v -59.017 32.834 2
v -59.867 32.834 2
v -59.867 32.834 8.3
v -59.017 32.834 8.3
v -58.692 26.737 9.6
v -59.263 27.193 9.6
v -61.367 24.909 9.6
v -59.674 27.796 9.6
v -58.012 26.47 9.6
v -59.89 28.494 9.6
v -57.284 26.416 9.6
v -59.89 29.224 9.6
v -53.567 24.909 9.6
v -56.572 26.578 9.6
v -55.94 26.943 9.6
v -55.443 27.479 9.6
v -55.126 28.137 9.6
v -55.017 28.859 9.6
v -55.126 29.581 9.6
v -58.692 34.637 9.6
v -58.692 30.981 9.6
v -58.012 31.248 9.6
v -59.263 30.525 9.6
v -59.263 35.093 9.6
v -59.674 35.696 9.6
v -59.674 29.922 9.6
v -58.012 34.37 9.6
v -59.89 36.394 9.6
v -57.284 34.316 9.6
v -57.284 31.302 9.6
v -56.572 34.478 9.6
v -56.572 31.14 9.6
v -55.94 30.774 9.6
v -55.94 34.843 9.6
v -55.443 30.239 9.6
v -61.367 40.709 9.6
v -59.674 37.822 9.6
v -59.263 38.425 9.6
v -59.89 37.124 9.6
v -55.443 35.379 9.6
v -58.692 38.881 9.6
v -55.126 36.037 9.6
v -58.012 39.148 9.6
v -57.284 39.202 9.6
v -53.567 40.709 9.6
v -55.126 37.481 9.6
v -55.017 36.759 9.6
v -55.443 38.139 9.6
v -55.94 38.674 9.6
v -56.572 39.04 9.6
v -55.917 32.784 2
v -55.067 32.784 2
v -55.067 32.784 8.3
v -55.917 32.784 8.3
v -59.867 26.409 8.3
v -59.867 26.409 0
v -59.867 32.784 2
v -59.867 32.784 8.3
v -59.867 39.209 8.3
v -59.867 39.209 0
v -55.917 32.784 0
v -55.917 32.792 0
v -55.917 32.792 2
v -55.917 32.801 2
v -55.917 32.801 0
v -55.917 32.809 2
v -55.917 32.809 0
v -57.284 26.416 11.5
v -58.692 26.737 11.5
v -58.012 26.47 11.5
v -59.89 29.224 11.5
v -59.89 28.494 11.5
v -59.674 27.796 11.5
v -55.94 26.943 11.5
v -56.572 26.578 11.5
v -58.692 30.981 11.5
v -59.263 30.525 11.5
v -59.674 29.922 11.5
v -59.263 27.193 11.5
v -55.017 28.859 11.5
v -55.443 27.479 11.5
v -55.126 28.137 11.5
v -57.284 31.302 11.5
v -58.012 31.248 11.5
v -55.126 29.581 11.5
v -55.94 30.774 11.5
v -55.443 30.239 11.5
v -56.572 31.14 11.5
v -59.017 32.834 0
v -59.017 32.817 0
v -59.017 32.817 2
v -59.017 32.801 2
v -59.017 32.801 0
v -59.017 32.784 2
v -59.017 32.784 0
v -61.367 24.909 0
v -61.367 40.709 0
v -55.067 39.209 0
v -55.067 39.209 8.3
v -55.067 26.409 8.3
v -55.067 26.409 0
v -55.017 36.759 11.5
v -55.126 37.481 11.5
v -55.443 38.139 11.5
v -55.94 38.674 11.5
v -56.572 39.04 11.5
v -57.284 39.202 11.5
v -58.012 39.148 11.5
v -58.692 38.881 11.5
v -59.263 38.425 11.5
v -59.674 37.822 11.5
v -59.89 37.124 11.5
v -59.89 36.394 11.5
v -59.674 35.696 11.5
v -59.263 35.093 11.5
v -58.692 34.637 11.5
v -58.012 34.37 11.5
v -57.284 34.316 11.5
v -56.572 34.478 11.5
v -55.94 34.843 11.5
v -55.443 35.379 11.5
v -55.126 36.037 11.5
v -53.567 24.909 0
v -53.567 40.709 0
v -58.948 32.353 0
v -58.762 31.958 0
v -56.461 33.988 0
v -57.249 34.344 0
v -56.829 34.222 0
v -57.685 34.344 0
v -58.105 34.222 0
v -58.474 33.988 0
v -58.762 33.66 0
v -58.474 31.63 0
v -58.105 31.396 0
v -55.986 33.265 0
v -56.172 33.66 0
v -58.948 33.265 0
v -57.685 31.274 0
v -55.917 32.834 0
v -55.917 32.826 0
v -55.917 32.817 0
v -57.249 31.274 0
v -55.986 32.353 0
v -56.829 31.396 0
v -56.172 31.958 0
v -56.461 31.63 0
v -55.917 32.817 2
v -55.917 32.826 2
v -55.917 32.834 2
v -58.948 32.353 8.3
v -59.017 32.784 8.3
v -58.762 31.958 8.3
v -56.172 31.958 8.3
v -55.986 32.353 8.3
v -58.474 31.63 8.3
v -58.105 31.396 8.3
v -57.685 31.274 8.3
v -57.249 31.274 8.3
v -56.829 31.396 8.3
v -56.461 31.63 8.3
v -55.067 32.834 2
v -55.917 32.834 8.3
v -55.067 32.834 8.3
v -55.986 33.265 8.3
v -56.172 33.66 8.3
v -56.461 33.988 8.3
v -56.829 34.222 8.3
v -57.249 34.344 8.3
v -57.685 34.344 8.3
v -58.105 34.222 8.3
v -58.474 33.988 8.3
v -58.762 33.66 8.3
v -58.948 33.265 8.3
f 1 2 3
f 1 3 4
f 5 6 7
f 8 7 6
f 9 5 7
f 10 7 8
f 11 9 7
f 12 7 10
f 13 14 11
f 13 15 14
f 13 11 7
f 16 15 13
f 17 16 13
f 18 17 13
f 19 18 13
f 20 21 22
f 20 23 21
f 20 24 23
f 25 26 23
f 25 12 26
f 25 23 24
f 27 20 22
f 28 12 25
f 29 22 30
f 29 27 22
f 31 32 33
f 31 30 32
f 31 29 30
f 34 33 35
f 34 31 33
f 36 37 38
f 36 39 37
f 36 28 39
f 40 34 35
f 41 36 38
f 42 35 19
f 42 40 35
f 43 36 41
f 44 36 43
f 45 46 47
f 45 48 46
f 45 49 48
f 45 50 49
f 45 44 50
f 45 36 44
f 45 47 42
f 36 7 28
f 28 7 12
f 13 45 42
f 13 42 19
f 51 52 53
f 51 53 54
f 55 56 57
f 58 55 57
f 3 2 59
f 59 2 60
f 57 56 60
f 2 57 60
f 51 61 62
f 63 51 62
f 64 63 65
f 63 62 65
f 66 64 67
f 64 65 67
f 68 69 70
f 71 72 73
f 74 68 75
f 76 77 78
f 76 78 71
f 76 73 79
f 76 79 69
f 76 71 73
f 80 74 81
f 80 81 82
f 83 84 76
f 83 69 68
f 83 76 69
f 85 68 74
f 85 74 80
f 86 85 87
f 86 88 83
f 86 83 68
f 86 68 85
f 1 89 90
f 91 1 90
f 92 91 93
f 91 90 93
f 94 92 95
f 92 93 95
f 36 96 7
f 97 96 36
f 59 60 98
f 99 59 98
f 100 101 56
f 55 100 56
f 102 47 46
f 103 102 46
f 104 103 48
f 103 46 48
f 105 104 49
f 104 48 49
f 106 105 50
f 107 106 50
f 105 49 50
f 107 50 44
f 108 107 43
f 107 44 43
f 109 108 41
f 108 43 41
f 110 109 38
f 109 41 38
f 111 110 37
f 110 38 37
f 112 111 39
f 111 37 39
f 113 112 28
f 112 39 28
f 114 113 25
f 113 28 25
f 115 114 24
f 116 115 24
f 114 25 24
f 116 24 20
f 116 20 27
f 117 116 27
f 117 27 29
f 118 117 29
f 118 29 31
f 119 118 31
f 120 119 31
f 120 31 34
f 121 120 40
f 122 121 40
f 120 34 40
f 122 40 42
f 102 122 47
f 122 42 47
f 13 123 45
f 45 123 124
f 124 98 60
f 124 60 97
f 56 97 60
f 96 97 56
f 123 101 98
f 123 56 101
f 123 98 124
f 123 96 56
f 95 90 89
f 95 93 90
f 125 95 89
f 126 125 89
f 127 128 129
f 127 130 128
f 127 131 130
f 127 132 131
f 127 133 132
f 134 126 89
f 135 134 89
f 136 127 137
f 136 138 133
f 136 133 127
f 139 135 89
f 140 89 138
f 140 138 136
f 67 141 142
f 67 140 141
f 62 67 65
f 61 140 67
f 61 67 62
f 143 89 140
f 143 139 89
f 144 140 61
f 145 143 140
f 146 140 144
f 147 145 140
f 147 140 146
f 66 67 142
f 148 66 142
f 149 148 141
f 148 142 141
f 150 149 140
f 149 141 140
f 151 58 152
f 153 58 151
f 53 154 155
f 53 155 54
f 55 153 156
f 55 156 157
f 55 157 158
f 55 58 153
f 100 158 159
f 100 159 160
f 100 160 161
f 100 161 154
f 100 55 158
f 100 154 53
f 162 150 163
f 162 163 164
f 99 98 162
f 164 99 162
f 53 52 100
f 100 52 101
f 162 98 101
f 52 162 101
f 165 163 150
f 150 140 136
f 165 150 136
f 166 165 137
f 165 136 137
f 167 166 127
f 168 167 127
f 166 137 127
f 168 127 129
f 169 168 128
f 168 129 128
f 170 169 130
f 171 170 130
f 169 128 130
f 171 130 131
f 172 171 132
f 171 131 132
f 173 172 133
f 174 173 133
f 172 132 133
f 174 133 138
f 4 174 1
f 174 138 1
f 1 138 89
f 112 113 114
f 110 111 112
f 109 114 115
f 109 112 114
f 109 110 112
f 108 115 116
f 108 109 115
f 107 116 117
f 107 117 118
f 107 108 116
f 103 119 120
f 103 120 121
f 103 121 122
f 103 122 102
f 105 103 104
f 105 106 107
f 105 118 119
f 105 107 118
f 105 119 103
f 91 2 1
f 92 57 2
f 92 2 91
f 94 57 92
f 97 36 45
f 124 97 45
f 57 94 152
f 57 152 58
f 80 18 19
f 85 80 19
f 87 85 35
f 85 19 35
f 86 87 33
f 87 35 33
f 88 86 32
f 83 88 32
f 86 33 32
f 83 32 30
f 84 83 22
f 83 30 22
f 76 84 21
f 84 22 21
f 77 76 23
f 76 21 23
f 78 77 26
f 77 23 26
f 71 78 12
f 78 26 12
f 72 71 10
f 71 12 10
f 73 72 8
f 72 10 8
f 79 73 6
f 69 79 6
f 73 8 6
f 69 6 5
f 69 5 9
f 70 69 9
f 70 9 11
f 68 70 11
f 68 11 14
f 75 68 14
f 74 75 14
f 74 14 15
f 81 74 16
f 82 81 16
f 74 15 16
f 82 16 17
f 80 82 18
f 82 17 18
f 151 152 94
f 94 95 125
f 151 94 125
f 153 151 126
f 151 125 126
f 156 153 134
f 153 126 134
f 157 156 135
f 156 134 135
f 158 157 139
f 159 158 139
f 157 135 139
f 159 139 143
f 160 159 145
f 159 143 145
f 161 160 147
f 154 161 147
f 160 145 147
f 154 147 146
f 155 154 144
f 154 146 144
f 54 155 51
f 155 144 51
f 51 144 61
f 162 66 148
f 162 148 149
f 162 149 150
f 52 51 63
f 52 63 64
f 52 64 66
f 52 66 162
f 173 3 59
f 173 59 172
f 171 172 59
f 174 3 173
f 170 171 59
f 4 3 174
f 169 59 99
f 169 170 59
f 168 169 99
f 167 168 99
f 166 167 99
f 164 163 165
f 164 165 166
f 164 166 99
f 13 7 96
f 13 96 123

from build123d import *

# Parameters (mm, degrees)
F0_W      = 7.8
F0_H      = 15.8
F2_DEPTH  = 9.6
F3_R      = 2.45
F4_DEPTH  = 1.9
F6_DEPTH  = 8.3
F7_DEPTH  = 8.3
F8_DEPTH  = 8.3
F9_DEPTH  = 8.3
F10_DEPTH = 2
F11_DEPTH = 2


with BuildPart() as f2:
    # F0 (on Top) → F2 (new body)
    with BuildSketch(Plane.XY):
        with Locations((-57.467087, 32.808982)):
            Rectangle(F0_W, F0_H)
    extrude(amount=F2_DEPTH)

    # F3 (on face) → F4 (join)
    with BuildSketch(Plane.XY.offset(9.6)):
        with Locations((-57.467087, 36.758982)):
            Circle(F3_R)
        with Locations((-57.467087, 28.858982)):
            Circle(F3_R)
    extrude(amount=F4_DEPTH)

    # F5 (on face) → F6 (cut)
    with BuildSketch(Plane(origin=(0, 0, 0), x_dir=(1, 0, 0), z_dir=(0, 0, -1))):
        with BuildLine():
            Line((-55.067087, -26.408982), (-59.867087, -26.408982))
            Line((-59.867087, -26.408982), (-59.867087, -32.783981))
            Line((-59.867087, -32.783981), (-59.016885, -32.783981))
            ThreePointArc((-59.016885, -32.783981), (-57.467087, -31.258982), (-55.917289, -32.783981))
            Line((-55.917289, -32.783981), (-55.067087, -32.783981))
            Line((-55.067087, -32.783981), (-55.067087, -26.408982))
        make_face()
    extrude(amount=-F6_DEPTH, mode=Mode.SUBTRACT)

    # F5 (on face) → F7 (cut)
    with BuildSketch(Plane(origin=(0, 0, 0), x_dir=(1, 0, 0), z_dir=(0, 0, -1))):
        with BuildLine():
            Line((-55.067087, -26.408982), (-59.867087, -26.408982))
            Line((-59.867087, -26.408982), (-59.867087, -32.783981))
            Line((-59.867087, -32.783981), (-59.016885, -32.783981))
            ThreePointArc((-59.016885, -32.783981), (-57.467087, -31.258982), (-55.917289, -32.783981))
            Line((-55.917289, -32.783981), (-55.067087, -32.783981))
            Line((-55.067087, -32.783981), (-55.067087, -26.408982))
        make_face()
        with BuildLine():
            Line((-59.016885, -32.783981), (-59.867087, -32.783981))
            Line((-59.867087, -32.783981), (-59.867087, -32.833982))
            Line((-59.867087, -32.833982), (-59.016885, -32.833982))
            ThreePointArc((-59.016885, -32.833982), (-59.017087, -32.808982), (-59.016885, -32.783981))
        make_face()
        with BuildLine():
            Line((-55.067087, -32.833982), (-55.067087, -32.783981))
            Line((-55.067087, -32.783981), (-55.917289, -32.783981))
            ThreePointArc((-55.917289, -32.783981), (-55.917137, -32.796481), (-55.917087, -32.808982))
            ThreePointArc((-55.917087, -32.808982), (-55.917137, -32.821483), (-55.917289, -32.833982))
            Line((-55.917289, -32.833982), (-55.067087, -32.833982))
        make_face()
        with BuildLine():
            Line((-59.016885, -32.833982), (-59.867087, -32.833982))
            Line((-59.867087, -32.833982), (-59.867087, -39.208982))
            Line((-59.867087, -39.208982), (-55.067087, -39.208982))
            Line((-55.067087, -39.208982), (-55.067087, -32.833982))
            Line((-55.067087, -32.833982), (-55.917289, -32.833982))
            ThreePointArc((-55.917289, -32.833982), (-57.467087, -34.358982), (-59.016885, -32.833982))
        make_face()
    extrude(amount=-F7_DEPTH, mode=Mode.SUBTRACT)

    # F5 (on face) → F8 (join)
    with BuildSketch(Plane(origin=(0, 0, 0), x_dir=(1, 0, 0), z_dir=(0, 0, -1))):
        with BuildLine():
            Line((-55.067087, -32.833982), (-55.067087, -32.783981))
            Line((-55.067087, -32.783981), (-55.917289, -32.783981))
            ThreePointArc((-55.917289, -32.783981), (-55.917137, -32.796481), (-55.917087, -32.808982))
            ThreePointArc((-55.917087, -32.808982), (-55.917137, -32.821483), (-55.917289, -32.833982))
            Line((-55.917289, -32.833982), (-55.067087, -32.833982))
        make_face()
    extrude(amount=-F8_DEPTH)

    # F5 (on face) → F9 (join)
    with BuildSketch(Plane(origin=(0, 0, 0), x_dir=(1, 0, 0), z_dir=(0, 0, -1))):
        with BuildLine():
            Line((-59.016885, -32.783981), (-59.867087, -32.783981))
            Line((-59.867087, -32.783981), (-59.867087, -32.833982))
            Line((-59.867087, -32.833982), (-59.016885, -32.833982))
            ThreePointArc((-59.016885, -32.833982), (-59.017087, -32.808982), (-59.016885, -32.783981))
        make_face()
    extrude(amount=-F9_DEPTH)

    # F5 (on face) → F10 (cut)
    with BuildSketch(Plane(origin=(0, 0, 0), x_dir=(1, 0, 0), z_dir=(0, 0, -1))):
        with BuildLine():
            Line((-59.016885, -32.783981), (-59.867087, -32.783981))
            Line((-59.867087, -32.783981), (-59.867087, -32.833982))
            Line((-59.867087, -32.833982), (-59.016885, -32.833982))
            ThreePointArc((-59.016885, -32.833982), (-59.017087, -32.808982), (-59.016885, -32.783981))
        make_face()
    extrude(amount=-F10_DEPTH, mode=Mode.SUBTRACT)

    # F5 (on face) → F11 (cut)
    with BuildSketch(Plane(origin=(0, 0, 0), x_dir=(1, 0, 0), z_dir=(0, 0, -1))):
        with BuildLine():
            Line((-55.067087, -32.833982), (-55.067087, -32.783981))
            Line((-55.067087, -32.783981), (-55.917289, -32.783981))
            ThreePointArc((-55.917289, -32.783981), (-55.917137, -32.796481), (-55.917087, -32.808982))
            ThreePointArc((-55.917087, -32.808982), (-55.917137, -32.821483), (-55.917289, -32.833982))
            Line((-55.917289, -32.833982), (-55.067087, -32.833982))
        make_face()
    extrude(amount=-F11_DEPTH, mode=Mode.SUBTRACT)


solid = f2.part
